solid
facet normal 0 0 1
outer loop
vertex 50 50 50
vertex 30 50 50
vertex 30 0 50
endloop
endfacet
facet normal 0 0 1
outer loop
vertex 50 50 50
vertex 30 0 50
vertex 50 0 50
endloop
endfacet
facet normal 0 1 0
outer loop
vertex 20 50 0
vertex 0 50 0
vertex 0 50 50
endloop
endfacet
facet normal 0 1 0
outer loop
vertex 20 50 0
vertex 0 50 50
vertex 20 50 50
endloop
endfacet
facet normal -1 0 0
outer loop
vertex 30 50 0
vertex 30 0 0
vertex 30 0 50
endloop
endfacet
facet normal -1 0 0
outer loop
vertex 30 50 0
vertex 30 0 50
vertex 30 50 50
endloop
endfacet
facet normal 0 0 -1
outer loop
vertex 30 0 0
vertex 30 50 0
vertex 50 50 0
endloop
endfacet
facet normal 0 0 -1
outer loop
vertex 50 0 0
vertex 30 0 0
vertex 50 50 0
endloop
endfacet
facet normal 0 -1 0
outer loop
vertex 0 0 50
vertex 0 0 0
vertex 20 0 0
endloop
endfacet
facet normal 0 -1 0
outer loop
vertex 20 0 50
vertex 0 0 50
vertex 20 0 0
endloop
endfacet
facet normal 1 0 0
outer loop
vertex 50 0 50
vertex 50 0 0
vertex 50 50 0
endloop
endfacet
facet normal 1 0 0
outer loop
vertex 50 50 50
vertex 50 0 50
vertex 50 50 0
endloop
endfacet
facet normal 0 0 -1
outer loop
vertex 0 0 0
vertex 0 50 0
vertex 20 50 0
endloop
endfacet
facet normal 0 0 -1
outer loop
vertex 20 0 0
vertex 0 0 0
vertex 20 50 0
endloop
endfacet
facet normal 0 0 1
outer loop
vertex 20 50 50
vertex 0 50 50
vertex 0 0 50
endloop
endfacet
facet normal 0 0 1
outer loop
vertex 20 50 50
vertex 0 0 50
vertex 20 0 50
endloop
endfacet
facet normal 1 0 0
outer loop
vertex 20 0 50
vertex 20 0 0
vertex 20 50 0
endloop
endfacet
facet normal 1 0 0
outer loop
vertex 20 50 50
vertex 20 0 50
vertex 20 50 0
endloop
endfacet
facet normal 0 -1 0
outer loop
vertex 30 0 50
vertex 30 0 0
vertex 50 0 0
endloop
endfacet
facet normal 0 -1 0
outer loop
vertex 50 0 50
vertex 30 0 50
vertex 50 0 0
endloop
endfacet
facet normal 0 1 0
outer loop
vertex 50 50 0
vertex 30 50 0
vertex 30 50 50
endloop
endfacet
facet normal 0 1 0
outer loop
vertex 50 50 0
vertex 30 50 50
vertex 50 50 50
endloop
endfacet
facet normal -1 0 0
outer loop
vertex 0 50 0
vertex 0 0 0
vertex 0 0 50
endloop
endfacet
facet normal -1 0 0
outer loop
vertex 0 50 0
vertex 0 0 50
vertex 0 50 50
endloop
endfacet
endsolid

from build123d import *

# Parameters (mm, degrees)
SZKIC1_W                    = 20
SZKIC1_H                    = 50
DODANIE_WYCI_GNI_CIE1_DEPTH = 50
SZYK_LINIOWY1_COUNT         = 2
SZYK_LINIOWY1_PITCH         = 30


with BuildPart() as part:
    # Szkic1 → Dodanie-wyciągnięcie1 (new body)
    with BuildSketch(Plane.XY):
        with Locations((10, 25)):
            Rectangle(SZKIC1_W, SZKIC1_H)
    extrude(amount=DODANIE_WYCI_GNI_CIE1_DEPTH)


with BuildPart() as szyk_liniowy1_1:
    # Szyk liniowy1: pattern copy
    add(part.part.moved(Location(Vector(1, 0, 0) * (1 * SZYK_LINIOWY1_PITCH))))


solid = Compound([part.part, szyk_liniowy1_1.part])
